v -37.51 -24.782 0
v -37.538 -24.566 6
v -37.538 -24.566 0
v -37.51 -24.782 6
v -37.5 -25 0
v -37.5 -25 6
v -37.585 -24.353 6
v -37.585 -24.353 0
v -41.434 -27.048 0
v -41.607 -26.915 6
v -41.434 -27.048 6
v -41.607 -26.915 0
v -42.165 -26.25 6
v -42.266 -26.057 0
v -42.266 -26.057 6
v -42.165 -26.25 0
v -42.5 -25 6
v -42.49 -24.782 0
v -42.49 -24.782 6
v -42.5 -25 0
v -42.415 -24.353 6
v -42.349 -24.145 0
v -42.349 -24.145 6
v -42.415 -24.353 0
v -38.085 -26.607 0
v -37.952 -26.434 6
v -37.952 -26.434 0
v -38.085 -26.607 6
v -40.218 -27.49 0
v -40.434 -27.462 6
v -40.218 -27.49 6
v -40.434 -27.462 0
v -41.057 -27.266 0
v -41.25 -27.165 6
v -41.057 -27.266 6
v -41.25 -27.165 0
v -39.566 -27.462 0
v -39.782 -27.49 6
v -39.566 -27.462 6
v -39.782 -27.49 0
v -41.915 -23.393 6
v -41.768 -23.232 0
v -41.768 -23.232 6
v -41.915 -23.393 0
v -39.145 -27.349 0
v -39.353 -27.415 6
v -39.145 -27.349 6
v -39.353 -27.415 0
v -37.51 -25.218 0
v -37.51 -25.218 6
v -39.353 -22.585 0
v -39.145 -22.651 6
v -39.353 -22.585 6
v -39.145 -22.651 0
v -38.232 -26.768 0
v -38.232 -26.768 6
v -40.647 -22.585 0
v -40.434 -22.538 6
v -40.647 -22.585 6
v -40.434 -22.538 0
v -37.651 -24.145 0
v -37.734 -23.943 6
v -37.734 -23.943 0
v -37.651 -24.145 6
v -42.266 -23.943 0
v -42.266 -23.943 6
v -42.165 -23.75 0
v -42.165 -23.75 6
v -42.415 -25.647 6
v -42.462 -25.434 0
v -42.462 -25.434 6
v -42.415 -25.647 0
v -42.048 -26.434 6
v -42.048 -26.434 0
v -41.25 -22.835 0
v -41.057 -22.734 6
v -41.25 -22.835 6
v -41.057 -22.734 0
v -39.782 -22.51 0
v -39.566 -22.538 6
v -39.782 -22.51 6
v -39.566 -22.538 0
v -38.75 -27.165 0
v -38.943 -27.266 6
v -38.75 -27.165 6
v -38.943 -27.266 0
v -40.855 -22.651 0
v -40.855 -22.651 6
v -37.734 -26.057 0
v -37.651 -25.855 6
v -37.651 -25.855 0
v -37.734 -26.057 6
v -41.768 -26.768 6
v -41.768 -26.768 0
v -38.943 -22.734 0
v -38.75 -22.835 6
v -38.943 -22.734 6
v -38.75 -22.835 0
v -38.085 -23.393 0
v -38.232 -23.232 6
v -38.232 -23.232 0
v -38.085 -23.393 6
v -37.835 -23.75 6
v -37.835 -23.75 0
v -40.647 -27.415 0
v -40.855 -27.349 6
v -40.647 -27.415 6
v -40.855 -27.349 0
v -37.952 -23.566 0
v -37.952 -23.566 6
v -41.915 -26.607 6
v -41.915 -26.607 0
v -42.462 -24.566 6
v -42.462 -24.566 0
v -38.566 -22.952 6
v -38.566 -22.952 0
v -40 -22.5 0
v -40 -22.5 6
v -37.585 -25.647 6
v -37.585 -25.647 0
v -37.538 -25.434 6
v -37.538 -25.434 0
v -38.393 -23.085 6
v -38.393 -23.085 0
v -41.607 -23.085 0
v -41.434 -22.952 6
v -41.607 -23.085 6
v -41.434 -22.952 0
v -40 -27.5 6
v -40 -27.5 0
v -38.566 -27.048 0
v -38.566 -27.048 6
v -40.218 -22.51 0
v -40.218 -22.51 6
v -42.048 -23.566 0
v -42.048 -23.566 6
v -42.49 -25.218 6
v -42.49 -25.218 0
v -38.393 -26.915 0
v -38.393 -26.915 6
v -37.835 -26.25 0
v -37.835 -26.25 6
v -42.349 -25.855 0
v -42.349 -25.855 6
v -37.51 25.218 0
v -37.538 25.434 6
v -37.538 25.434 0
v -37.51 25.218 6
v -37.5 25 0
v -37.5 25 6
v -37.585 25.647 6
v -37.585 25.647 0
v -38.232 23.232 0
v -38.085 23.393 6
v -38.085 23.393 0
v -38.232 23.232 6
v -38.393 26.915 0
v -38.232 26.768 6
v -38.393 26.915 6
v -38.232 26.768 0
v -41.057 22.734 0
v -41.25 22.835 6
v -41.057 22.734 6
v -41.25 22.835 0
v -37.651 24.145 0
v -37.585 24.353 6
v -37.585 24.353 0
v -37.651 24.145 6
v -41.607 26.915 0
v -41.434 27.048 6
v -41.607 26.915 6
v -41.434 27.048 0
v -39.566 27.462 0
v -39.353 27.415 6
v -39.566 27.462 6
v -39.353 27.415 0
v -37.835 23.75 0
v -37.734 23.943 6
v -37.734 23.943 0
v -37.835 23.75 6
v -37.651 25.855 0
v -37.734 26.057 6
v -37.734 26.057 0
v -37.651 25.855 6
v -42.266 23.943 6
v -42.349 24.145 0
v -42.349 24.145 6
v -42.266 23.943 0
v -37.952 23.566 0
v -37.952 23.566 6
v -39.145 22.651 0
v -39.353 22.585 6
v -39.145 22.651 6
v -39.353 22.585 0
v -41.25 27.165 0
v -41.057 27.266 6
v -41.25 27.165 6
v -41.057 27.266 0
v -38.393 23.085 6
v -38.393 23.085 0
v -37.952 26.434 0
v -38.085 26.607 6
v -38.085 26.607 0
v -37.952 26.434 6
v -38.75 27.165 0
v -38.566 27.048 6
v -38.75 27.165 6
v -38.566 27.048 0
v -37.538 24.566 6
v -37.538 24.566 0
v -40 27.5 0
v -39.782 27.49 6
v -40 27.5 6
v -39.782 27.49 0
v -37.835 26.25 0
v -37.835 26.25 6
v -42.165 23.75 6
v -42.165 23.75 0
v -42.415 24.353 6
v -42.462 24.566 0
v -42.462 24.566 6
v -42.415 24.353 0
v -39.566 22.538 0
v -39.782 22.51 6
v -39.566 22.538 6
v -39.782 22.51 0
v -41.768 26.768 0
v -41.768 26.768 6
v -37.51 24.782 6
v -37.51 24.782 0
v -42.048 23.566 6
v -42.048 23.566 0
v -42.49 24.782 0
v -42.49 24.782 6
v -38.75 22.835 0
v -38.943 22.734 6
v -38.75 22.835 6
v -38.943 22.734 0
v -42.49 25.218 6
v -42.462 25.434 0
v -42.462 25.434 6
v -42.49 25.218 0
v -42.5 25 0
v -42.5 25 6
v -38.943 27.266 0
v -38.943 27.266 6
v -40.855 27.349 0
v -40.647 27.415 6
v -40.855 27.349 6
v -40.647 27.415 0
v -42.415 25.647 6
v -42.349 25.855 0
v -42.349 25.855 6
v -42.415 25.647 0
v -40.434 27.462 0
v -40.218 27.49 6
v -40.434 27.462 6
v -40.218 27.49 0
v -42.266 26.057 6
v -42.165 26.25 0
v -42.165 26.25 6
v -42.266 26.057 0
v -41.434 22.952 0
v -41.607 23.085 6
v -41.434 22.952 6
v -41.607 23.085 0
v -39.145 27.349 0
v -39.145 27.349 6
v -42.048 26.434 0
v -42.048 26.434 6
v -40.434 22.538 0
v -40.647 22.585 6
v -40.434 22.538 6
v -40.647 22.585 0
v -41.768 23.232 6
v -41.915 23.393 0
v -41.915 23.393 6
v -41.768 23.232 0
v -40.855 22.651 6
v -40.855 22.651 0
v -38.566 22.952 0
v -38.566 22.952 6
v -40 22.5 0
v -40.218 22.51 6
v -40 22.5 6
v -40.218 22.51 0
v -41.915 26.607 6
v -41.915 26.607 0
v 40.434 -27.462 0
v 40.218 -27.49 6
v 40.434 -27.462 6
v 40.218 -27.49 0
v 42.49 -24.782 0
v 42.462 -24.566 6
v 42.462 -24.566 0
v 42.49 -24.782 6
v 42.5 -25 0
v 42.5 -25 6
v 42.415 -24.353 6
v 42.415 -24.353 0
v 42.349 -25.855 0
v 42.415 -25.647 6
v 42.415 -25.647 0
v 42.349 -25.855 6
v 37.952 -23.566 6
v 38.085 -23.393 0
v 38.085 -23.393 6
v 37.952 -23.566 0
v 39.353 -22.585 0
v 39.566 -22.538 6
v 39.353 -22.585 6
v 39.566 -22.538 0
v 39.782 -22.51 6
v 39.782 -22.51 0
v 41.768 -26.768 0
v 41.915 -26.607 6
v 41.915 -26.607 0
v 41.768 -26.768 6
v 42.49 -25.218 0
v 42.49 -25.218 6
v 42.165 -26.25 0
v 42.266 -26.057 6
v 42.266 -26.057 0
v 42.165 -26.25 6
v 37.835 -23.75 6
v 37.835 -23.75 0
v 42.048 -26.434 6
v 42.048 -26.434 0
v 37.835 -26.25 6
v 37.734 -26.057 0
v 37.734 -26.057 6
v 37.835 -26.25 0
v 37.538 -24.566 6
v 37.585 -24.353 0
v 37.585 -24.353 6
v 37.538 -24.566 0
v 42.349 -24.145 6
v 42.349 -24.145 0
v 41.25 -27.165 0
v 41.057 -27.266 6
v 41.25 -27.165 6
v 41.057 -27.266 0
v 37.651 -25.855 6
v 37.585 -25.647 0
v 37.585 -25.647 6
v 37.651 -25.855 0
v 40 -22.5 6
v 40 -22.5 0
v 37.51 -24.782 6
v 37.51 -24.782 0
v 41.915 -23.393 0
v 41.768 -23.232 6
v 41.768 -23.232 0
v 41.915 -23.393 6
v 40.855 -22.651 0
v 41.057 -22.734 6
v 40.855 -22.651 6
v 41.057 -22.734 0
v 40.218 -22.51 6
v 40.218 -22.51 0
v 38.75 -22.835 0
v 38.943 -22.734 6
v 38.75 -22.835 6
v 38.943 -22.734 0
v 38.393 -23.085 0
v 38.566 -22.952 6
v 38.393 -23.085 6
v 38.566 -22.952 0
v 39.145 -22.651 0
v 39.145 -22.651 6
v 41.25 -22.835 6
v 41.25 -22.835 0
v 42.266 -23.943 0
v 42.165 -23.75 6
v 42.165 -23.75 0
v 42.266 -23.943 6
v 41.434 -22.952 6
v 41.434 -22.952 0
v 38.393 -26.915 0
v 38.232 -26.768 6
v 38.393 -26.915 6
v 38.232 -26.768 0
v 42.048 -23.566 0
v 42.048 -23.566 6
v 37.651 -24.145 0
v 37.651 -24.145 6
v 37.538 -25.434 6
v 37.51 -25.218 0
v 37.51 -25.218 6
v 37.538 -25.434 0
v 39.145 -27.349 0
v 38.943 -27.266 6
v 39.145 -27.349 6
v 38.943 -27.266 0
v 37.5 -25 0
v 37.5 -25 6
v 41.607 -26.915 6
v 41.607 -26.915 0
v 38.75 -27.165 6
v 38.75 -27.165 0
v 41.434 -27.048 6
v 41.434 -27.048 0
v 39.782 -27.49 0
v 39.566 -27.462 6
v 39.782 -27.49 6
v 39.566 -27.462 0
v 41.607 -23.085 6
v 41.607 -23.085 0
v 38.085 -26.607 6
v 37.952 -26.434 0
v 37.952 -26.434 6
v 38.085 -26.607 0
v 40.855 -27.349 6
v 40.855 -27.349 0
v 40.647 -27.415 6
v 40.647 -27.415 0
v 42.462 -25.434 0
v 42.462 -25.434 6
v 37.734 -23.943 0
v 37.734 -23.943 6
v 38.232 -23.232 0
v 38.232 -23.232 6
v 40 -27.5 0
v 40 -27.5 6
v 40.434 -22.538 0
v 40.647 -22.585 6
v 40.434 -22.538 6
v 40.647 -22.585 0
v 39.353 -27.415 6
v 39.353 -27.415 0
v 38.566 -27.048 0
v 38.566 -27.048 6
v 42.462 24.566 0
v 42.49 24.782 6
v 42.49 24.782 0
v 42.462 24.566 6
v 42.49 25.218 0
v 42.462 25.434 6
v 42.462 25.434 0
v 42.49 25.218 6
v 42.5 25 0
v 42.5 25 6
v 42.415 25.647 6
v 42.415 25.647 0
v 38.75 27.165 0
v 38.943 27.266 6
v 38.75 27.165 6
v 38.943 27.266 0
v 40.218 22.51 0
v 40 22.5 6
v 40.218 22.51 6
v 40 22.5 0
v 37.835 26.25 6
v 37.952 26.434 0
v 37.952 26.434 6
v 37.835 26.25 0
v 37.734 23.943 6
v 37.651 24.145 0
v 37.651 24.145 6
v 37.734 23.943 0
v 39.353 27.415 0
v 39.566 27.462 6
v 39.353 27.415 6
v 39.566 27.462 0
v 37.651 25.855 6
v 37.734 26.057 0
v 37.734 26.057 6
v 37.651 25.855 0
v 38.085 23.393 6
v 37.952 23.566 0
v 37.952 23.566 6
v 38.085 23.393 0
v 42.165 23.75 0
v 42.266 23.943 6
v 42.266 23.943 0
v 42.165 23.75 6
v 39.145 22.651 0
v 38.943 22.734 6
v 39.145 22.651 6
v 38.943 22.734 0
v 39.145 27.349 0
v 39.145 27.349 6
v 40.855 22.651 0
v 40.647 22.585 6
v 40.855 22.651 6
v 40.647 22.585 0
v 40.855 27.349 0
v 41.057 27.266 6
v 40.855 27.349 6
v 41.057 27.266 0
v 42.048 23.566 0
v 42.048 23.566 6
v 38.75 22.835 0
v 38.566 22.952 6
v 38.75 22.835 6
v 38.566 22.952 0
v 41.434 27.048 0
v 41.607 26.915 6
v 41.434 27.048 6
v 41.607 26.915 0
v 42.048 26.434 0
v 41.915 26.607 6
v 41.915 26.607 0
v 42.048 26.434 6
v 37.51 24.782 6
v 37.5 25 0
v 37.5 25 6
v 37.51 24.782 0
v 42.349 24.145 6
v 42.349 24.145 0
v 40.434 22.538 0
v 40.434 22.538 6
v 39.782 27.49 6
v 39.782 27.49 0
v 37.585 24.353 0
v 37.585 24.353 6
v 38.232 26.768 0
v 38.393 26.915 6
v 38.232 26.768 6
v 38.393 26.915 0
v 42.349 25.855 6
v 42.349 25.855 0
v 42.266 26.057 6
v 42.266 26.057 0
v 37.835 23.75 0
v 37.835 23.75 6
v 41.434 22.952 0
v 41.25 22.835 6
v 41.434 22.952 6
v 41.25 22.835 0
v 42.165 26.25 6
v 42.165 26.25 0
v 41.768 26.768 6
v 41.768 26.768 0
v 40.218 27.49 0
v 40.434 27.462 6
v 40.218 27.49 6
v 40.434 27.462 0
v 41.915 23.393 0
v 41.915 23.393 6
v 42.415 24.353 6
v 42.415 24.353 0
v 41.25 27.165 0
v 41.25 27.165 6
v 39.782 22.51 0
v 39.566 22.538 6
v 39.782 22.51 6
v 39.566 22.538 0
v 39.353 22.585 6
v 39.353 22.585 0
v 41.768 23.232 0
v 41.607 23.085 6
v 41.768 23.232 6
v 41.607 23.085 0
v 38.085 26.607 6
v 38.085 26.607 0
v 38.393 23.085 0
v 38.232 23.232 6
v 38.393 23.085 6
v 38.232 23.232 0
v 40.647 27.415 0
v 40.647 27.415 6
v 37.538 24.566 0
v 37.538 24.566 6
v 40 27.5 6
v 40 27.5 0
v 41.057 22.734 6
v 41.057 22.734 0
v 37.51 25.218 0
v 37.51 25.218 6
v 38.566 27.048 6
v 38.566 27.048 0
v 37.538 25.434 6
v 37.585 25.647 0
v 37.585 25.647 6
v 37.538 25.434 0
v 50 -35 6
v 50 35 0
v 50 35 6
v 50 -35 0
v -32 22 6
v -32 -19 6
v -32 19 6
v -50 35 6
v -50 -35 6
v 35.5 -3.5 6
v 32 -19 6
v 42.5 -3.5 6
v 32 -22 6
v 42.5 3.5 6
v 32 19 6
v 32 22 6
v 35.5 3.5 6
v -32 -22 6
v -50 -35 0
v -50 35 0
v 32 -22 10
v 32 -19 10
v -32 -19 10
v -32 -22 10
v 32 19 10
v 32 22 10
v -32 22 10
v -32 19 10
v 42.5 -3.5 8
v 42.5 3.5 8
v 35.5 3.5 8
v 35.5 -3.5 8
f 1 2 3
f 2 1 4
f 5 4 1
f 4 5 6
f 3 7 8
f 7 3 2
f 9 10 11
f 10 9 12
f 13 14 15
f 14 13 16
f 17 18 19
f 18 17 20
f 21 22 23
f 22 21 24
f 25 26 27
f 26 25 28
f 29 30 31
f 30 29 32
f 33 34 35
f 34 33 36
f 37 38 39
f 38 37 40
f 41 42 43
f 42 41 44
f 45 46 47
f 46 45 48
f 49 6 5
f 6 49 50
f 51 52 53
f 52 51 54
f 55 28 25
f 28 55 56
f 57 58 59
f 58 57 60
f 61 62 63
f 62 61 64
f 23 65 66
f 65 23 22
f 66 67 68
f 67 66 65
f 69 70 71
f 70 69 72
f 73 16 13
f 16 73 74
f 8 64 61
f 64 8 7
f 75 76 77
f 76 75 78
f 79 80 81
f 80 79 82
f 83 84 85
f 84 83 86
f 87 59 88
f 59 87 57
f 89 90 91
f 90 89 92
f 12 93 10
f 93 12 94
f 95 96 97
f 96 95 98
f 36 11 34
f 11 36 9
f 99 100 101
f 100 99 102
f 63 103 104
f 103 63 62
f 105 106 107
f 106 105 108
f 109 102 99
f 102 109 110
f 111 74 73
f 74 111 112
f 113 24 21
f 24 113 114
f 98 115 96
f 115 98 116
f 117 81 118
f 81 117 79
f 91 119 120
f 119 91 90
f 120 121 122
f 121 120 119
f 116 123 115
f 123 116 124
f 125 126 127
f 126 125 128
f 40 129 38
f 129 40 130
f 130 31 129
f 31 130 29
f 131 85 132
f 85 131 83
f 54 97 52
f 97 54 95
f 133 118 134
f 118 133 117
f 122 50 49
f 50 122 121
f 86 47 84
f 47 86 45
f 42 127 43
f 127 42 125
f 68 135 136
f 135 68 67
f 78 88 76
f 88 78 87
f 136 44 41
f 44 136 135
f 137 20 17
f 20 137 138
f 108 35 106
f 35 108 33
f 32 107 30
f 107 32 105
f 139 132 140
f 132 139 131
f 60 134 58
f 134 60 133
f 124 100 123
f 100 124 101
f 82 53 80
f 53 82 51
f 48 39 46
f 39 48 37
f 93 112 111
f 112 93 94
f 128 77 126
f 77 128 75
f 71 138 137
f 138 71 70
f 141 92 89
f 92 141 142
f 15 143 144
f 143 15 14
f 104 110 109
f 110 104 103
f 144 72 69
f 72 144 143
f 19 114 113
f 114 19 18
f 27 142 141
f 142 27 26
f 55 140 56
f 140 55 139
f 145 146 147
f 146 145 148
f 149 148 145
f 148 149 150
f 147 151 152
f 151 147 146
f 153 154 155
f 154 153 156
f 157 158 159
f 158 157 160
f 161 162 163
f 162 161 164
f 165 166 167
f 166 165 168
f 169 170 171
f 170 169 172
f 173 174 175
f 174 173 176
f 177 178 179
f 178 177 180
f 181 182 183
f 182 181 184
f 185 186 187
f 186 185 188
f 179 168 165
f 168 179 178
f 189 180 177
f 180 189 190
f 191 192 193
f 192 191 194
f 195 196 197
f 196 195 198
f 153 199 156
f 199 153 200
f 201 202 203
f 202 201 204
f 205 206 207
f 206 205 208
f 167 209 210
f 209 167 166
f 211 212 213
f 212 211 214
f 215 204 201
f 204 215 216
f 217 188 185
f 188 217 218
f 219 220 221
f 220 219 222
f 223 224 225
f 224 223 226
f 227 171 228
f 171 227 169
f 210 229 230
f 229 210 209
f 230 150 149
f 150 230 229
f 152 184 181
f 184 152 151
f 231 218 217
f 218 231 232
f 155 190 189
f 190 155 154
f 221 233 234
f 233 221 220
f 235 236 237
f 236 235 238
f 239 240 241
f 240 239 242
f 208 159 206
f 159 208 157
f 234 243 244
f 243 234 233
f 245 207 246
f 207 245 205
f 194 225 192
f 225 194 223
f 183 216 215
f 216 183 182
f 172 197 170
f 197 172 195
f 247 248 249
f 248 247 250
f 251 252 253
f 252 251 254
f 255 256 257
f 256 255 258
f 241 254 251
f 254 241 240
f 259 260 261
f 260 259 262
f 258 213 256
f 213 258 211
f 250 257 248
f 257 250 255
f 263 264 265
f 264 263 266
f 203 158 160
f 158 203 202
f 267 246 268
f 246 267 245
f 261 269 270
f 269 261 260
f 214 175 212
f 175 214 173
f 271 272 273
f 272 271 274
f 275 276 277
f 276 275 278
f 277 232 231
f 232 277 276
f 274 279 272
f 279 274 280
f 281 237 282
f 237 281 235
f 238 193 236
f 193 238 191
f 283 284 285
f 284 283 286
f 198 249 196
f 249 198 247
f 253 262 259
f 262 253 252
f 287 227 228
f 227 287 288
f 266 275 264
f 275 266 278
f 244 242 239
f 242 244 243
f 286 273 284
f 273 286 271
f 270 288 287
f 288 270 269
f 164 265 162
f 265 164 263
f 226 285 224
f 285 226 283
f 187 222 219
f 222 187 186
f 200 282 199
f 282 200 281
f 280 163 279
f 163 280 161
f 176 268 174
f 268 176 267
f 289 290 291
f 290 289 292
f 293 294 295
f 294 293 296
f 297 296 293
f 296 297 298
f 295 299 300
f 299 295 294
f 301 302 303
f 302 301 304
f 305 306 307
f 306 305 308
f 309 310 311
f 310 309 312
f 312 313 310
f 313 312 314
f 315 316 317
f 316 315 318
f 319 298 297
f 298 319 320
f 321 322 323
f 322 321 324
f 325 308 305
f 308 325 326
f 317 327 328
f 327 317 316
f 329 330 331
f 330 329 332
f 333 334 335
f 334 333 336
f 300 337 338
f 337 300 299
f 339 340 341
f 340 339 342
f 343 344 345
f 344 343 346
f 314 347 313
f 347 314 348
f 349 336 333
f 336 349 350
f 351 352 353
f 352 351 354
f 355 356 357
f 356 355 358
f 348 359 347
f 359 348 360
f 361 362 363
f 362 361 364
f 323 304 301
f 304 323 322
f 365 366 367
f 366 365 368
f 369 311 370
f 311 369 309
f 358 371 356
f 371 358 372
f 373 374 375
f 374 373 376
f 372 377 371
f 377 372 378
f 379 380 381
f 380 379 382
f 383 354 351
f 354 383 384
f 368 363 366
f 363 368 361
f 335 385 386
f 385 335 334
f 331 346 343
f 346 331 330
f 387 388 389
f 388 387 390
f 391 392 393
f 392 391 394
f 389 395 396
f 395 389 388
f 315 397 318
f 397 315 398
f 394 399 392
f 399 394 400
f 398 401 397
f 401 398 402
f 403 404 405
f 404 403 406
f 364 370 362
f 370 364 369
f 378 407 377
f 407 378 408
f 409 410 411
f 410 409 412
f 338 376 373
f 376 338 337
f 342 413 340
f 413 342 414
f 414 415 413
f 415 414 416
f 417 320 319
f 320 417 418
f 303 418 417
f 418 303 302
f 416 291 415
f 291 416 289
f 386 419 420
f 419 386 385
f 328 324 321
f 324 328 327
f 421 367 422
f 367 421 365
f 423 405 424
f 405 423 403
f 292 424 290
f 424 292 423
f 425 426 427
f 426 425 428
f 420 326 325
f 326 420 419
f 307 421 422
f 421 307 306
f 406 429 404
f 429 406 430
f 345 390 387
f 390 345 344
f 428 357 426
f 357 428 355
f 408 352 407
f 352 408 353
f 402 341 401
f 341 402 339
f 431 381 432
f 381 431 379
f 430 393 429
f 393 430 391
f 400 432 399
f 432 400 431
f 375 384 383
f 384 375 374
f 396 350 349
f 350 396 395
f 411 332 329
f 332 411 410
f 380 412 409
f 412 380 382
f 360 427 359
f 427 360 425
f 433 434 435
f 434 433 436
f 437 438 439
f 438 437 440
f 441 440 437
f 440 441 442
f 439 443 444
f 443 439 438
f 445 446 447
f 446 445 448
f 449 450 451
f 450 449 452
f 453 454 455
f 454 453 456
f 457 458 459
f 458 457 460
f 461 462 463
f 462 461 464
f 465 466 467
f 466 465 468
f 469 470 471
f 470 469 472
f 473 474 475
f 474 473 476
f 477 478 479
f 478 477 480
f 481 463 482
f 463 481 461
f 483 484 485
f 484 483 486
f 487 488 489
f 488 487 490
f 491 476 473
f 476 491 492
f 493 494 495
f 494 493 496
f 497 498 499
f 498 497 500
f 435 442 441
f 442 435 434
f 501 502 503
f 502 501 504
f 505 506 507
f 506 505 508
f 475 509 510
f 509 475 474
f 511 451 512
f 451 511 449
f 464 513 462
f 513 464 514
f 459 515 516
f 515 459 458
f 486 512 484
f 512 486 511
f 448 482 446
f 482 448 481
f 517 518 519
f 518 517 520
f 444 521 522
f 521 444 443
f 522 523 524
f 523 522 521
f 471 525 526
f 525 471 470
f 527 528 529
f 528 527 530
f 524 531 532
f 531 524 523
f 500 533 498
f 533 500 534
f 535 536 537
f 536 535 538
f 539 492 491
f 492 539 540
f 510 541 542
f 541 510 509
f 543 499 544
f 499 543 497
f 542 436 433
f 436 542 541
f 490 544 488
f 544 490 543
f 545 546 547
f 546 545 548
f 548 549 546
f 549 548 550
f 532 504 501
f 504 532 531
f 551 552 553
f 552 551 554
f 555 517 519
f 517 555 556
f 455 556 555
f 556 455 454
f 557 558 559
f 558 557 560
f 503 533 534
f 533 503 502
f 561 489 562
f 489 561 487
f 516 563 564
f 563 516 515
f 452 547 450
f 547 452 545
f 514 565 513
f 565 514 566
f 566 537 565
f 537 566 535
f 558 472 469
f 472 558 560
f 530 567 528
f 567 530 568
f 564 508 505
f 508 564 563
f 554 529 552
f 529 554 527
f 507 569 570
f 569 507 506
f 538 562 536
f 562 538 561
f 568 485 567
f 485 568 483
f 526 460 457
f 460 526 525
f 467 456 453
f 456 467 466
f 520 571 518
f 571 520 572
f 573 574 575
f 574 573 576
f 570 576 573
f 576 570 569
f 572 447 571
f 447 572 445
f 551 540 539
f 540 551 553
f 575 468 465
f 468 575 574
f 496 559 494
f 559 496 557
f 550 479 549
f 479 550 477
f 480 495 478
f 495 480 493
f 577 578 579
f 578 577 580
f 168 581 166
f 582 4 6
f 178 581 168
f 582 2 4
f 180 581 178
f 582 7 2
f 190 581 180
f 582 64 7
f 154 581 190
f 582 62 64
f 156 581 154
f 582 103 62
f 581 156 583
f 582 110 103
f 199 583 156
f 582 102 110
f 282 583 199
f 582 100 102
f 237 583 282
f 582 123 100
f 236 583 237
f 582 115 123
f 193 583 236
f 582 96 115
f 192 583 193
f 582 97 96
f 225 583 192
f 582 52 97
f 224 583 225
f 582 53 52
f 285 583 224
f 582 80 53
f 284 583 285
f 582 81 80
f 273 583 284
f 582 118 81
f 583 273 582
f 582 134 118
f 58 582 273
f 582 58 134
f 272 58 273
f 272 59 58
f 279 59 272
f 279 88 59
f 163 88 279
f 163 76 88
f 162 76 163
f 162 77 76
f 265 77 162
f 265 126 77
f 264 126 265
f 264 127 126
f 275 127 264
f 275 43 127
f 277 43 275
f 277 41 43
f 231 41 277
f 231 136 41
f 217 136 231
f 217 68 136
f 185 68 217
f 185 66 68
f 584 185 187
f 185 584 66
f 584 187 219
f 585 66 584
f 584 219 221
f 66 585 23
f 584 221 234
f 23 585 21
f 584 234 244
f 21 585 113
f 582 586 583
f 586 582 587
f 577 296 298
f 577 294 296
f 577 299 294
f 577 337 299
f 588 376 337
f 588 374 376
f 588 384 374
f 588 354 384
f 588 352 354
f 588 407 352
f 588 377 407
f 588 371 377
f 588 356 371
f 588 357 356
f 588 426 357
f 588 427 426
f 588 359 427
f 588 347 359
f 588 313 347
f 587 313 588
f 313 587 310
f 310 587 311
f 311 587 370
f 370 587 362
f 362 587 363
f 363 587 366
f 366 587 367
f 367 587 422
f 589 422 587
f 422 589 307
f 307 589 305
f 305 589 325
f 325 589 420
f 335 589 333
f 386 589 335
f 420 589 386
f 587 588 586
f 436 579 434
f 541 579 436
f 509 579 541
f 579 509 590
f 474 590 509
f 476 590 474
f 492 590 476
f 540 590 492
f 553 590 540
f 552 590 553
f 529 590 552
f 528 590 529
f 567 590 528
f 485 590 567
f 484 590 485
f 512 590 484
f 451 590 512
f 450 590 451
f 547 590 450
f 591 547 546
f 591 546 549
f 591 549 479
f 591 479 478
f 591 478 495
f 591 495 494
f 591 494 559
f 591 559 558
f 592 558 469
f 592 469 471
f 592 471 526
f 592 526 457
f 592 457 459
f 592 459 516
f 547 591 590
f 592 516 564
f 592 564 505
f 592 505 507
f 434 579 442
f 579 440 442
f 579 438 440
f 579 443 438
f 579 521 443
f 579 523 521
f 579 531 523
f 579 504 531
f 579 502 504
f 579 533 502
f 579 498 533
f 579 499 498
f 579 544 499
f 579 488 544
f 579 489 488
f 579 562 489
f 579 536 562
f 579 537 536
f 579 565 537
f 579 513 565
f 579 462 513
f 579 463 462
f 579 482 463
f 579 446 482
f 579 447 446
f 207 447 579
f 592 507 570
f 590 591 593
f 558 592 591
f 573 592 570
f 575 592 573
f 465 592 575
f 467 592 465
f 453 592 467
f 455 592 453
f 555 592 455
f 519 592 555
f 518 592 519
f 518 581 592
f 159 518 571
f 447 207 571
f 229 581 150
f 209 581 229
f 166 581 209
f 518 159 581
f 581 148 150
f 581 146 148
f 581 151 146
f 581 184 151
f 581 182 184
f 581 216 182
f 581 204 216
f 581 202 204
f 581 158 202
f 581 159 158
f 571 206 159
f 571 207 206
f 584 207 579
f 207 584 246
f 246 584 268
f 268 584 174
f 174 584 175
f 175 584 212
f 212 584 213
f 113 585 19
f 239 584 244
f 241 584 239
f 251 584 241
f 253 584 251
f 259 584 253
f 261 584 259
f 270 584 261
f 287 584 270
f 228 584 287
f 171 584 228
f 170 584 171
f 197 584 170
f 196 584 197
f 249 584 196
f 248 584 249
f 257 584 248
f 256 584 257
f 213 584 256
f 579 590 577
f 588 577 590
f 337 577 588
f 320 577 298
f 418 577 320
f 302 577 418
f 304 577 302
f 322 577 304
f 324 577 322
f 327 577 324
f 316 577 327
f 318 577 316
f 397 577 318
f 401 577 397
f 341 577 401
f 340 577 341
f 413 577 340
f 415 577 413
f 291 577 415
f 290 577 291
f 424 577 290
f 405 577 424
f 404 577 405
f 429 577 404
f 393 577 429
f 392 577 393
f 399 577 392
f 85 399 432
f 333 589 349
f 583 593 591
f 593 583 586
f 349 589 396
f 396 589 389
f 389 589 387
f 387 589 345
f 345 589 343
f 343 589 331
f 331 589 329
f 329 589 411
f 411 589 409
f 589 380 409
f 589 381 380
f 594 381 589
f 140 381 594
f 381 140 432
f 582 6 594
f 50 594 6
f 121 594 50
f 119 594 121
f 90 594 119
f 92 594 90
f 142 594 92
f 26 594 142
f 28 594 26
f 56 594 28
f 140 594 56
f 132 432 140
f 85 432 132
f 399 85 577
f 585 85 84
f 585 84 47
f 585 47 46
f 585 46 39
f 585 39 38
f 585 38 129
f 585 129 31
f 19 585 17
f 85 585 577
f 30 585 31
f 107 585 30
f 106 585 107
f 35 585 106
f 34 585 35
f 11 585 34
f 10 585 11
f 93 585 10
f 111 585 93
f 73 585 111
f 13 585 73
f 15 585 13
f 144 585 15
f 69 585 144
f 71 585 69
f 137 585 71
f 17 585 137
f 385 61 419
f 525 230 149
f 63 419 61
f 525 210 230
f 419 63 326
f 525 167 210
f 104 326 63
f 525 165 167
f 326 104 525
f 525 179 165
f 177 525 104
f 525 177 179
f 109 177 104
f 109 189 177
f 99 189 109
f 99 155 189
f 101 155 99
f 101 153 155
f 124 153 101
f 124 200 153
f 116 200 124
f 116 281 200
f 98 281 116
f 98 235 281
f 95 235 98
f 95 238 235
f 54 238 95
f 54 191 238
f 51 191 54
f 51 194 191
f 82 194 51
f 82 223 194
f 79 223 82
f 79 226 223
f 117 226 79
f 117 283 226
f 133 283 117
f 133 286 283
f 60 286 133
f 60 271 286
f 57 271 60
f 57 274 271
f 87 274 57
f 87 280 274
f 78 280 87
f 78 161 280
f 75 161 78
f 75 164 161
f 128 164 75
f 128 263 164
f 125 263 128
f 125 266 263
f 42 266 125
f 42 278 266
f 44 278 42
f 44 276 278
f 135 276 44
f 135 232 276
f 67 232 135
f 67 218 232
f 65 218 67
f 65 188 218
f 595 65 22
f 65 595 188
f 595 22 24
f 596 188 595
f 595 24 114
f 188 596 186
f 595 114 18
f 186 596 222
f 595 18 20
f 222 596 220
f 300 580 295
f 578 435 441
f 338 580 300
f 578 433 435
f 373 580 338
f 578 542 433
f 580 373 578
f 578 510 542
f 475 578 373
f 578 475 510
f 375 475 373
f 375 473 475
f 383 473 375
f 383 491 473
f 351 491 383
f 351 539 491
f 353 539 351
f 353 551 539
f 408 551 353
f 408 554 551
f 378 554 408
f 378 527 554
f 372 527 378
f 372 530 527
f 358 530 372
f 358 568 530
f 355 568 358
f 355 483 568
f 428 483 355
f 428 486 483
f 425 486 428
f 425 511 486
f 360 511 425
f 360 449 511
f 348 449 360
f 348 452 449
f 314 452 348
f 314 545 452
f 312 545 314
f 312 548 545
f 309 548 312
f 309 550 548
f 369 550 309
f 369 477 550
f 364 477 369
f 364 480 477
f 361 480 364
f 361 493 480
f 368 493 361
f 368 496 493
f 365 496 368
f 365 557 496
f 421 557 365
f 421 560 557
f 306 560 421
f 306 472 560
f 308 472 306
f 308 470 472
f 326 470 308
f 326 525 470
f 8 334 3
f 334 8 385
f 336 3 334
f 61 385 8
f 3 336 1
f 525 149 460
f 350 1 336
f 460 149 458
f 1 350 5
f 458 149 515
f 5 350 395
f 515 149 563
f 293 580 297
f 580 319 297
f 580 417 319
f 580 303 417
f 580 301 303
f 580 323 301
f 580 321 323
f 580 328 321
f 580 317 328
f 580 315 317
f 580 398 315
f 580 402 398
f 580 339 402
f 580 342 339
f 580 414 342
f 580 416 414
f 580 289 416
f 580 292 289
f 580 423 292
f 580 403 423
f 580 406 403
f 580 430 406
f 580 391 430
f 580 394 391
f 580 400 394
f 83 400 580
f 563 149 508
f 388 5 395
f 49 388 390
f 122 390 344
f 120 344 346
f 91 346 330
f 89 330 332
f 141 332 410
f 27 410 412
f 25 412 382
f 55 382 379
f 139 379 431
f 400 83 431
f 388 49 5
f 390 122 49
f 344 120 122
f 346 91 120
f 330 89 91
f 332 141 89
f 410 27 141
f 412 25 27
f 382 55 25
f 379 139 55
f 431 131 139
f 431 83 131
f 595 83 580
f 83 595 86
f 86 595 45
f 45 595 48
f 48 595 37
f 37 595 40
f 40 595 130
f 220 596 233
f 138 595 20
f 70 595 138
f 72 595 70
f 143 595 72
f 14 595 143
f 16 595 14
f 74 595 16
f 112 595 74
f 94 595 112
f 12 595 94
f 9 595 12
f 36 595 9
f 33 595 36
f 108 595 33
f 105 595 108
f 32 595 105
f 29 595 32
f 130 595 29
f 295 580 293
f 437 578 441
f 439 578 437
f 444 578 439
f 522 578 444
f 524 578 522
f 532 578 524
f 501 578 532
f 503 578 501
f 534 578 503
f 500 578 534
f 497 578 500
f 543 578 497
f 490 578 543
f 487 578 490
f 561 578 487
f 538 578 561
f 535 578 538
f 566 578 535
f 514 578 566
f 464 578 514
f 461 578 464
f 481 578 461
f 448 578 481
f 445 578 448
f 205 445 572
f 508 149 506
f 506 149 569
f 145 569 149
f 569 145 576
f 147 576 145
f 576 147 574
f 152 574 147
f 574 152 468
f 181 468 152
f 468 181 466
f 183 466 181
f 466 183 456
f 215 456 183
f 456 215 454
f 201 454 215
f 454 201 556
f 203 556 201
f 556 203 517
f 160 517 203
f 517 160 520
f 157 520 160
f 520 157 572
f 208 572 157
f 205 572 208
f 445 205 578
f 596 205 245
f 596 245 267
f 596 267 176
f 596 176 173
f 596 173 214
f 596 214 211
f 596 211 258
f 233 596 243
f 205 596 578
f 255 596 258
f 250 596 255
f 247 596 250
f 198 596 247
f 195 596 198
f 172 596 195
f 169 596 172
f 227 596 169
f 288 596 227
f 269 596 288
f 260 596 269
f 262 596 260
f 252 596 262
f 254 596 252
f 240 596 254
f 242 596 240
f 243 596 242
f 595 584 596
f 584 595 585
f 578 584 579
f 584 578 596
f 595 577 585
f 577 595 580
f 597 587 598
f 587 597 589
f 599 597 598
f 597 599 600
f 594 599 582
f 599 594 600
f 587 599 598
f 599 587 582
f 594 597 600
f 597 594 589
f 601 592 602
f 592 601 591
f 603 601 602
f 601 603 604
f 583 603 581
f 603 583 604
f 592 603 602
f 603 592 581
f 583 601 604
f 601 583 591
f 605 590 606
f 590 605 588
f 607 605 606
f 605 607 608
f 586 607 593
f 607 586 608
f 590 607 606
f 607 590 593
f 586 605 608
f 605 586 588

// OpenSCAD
// Microfluidic chip imaging holder — reference solution
// Category: tools; purpose: repeatable positioning during optical chip imaging
// Print on flat base with z=0 on bed; PLA/PETG, no supports; not certified for clinical or sterile use
// SPDX-License-Identifier: CERN-OHL-P-2.0
$fn=72;
eps=0.05;
base_x=100;
base_y=70;
base_h=6;
window_x=60;
window_y=30;
hole_d=5;
hole_pitch_x=80;
hole_pitch_y=50;
rail_len=64;
rail_width=3;
rail_h=4;
rail_center_y=20.5;
marker_x=7;
marker_y=7;
marker_h=2;
marker_center_x=39;
assert(base_x > window_x + 2*hole_d);
assert(base_y > window_y + 2*hole_d);
assert(hole_pitch_x/2+hole_d/2 < base_x/2);
assert(hole_pitch_y/2+hole_d/2 < base_y/2);
assert(rail_center_y - rail_width/2 > window_y/2);
module reference(){
 union(){
  difference(){
   translate([-base_x/2,-base_y/2,0]) cube([base_x,base_y,base_h]);
   translate([-window_x/2,-window_y/2,-eps]) cube([0.01,0.01,0.01]);
   for(x=[-hole_pitch_x/2,hole_pitch_x/2])
    for(y=[-hole_pitch_y/2,hole_pitch_y/2])
     translate([x,y,-eps]) cylinder(d=hole_d,h=base_h+2*eps);
  }
  for(y=[-rail_center_y,rail_center_y])
   translate([-rail_len/2,y-rail_width/2,base_h-eps])
    cube([rail_len,rail_width,rail_h+eps]);
  translate([marker_center_x-marker_x/2,-marker_y/2,base_h-eps])
   cube([marker_x,marker_y,marker_h+eps]);
 }
}
reference();
